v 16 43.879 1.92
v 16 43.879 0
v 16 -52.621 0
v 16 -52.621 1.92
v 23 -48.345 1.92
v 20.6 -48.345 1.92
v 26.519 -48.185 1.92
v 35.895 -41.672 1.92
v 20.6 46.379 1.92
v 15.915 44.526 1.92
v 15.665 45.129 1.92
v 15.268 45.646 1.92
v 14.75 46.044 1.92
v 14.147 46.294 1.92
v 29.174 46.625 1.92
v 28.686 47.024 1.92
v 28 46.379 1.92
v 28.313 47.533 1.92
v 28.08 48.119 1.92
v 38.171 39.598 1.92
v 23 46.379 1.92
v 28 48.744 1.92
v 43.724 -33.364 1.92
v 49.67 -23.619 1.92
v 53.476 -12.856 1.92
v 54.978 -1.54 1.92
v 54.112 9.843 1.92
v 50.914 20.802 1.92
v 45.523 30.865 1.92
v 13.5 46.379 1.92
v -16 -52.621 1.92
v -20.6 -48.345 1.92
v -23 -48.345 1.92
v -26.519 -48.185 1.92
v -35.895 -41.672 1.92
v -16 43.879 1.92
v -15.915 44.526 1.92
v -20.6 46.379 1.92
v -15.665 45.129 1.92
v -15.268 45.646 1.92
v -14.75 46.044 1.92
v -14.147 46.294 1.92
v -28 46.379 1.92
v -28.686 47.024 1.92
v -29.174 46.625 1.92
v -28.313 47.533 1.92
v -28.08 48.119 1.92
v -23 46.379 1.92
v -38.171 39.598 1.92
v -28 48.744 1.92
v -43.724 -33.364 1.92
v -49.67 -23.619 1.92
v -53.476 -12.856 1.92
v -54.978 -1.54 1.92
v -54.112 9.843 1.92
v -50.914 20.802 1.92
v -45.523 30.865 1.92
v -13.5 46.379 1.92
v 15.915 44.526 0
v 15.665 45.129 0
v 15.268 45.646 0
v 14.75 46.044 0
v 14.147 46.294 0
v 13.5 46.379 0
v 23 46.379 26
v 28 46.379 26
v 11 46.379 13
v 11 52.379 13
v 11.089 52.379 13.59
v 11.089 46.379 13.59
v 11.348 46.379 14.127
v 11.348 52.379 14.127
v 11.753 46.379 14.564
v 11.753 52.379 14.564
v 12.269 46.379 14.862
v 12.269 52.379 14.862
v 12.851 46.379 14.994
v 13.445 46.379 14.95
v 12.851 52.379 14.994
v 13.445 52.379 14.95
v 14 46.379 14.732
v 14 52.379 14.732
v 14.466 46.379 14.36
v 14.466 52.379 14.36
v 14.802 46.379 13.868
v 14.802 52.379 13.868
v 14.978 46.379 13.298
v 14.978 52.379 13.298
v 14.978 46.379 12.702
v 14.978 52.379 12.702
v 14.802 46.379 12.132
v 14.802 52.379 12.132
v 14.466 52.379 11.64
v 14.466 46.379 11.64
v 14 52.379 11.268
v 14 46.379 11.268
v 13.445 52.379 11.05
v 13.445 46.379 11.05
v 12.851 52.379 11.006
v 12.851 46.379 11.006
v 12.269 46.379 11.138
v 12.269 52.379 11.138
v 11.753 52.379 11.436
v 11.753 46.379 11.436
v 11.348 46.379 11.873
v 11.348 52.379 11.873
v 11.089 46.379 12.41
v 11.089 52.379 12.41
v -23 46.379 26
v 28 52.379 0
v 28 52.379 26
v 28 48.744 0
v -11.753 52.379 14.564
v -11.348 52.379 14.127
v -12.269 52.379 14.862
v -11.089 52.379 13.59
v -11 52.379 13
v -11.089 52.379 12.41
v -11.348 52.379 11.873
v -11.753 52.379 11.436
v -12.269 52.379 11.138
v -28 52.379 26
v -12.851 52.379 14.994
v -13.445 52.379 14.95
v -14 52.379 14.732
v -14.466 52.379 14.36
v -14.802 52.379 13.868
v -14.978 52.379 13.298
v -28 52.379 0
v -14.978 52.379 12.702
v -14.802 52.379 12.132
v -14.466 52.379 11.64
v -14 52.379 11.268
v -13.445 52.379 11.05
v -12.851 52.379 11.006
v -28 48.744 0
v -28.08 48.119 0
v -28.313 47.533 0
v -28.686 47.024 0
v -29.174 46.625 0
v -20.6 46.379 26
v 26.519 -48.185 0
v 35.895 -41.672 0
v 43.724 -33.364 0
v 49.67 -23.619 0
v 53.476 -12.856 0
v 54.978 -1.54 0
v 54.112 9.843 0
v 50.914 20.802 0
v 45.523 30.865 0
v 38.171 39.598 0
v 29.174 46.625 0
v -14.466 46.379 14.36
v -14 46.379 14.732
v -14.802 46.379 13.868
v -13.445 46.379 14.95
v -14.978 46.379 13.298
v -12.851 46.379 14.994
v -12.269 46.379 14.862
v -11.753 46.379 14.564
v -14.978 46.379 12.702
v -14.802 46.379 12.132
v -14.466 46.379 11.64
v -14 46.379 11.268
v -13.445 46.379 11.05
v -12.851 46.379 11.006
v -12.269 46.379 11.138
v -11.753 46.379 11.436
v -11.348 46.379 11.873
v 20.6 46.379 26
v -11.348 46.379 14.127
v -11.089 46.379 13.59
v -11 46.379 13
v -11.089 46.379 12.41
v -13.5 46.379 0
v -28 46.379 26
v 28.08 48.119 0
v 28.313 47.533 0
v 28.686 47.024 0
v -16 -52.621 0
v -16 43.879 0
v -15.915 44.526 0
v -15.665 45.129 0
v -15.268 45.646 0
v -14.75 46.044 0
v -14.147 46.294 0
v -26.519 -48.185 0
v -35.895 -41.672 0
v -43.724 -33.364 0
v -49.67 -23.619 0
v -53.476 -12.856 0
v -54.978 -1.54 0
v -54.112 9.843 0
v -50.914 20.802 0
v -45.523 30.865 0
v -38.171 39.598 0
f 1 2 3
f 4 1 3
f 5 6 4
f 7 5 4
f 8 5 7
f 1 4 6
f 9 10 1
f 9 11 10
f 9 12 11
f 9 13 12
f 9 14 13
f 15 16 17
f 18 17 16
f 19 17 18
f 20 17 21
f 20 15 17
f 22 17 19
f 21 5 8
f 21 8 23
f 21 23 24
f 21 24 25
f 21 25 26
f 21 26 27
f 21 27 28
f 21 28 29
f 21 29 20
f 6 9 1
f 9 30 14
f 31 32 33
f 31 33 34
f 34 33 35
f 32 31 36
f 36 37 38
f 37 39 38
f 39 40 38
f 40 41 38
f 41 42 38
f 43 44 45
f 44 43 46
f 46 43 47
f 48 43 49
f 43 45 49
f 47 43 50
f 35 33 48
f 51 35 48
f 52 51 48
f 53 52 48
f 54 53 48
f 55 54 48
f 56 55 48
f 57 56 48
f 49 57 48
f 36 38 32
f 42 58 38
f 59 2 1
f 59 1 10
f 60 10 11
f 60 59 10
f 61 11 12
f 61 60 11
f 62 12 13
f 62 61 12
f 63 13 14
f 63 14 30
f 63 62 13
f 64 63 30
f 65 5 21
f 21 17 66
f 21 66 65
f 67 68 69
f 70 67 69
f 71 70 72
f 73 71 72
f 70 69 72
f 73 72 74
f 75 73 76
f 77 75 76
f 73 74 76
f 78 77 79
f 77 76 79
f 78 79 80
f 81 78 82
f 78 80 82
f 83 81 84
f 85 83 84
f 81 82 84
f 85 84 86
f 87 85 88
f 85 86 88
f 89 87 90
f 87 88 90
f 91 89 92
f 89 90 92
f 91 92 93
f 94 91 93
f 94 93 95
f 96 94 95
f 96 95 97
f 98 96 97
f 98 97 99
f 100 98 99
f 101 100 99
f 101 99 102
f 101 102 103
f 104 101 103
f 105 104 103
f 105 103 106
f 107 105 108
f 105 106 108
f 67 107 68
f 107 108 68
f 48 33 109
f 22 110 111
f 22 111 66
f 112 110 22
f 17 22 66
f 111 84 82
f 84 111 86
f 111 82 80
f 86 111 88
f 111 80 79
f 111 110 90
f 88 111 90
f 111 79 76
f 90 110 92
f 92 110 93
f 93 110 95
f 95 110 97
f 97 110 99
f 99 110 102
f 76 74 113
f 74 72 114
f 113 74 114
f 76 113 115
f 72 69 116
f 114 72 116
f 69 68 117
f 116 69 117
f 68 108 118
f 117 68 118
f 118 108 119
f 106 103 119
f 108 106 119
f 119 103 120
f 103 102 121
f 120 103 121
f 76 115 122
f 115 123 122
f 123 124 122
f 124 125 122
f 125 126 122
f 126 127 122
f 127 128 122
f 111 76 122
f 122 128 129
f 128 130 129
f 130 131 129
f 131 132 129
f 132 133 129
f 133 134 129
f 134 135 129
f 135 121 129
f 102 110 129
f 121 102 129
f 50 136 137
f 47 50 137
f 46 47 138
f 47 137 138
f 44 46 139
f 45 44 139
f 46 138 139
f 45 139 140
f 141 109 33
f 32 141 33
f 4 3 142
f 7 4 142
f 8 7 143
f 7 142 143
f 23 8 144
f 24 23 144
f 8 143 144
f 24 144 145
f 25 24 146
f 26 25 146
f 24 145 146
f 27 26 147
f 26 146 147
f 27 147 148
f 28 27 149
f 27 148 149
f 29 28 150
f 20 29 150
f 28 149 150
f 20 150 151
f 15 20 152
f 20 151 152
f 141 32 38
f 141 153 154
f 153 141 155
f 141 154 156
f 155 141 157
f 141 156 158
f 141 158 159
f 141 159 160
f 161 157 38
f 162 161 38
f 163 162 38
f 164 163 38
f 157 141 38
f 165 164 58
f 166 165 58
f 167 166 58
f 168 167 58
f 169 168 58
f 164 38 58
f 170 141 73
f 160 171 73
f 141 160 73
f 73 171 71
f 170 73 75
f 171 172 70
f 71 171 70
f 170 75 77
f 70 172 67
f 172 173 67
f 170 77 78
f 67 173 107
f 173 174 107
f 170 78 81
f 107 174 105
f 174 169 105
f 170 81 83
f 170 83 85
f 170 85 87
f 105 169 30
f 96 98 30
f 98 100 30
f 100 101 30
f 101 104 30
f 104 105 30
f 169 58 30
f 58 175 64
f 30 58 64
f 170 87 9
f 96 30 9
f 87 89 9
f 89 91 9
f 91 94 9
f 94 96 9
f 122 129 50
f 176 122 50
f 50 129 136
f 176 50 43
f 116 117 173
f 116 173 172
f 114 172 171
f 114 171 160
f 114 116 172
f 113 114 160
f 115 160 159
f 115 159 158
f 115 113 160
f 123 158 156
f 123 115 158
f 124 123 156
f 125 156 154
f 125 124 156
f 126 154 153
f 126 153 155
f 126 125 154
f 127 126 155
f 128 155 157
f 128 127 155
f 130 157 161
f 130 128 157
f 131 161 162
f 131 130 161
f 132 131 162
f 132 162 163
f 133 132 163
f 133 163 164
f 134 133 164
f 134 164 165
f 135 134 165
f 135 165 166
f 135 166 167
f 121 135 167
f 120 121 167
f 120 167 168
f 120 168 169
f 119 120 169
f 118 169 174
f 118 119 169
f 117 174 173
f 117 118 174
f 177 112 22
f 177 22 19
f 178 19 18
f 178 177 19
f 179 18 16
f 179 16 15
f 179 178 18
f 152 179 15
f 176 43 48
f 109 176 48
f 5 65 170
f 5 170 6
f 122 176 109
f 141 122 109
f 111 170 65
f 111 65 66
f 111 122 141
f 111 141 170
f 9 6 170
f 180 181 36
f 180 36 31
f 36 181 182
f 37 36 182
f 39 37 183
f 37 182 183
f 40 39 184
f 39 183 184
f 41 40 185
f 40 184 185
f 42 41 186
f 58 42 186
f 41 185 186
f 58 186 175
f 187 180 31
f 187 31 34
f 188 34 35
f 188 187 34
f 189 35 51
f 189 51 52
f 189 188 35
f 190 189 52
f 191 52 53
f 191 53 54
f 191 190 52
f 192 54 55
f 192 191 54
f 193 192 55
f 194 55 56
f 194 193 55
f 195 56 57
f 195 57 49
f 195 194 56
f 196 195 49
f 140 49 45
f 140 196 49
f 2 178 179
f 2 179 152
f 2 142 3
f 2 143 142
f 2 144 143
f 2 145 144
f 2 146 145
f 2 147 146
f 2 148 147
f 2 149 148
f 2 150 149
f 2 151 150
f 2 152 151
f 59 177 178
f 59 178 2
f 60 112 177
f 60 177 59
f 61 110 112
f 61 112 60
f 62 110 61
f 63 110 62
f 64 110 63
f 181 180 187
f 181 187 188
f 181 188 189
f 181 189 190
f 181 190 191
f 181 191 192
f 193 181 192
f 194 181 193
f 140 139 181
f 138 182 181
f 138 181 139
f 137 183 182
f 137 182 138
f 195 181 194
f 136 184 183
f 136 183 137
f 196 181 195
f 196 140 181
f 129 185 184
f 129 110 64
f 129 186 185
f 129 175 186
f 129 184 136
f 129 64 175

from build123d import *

# Parameters (mm, degrees)
PAD018_DEPTH = 1.92
SKETCH042_W  = 28
SKETCH042_H  = 26
SKETCH042_R  = 2
PAD020_DEPTH = 6
PAD021_DEPTH = 2.4


with BuildPart() as part:
    # Sketch038 → Pad018 (new body)
    with BuildSketch(Plane.XY):
        with BuildLine():
            ThreePointArc((16, -52.6212884677), (54.5217663163, -7.237195434), (29.1738989847, 46.6249248582))
            ThreePointArc((28, 48.7442306082), (28.3130783141, 47.5328784807), (29.1738989848, 46.6249248582))
            Line((28, 52.3787115323), (28, 48.7442306082))
            Line((0, 52.3787115323), (28, 52.3787115323))
            Line((0, 46.3787115323), (0, 52.3787115323))
            Line((13.5000003539, 46.3787115323), (0, 46.3787115323))
            ThreePointArc((16, 43.8787114546), (15.2677671056, 45.6464783327), (13.5000003539, 46.3787115323))
            Line((16, 43.8787114546), (16, -52.6212884677))
        make_face()
    pad018 = extrude(amount=PAD018_DEPTH)

    # Sketch042 (on DatumPlane) → Pad020 (join)
    with BuildSketch(Plane(origin=(0, 52.3787115323, 0), x_dir=(-1, 0, 0), z_dir=(0, 1, 0))):
        with Locations((-14, 13)):
            Rectangle(SKETCH042_W, SKETCH042_H)
        with Locations((-13, 13)):
            Circle(SKETCH042_R, mode=Mode.SUBTRACT)
    pad020 = extrude(amount=-PAD020_DEPTH)

    # Sketch043 (on DatumPlane) → Pad021 (join)
    with BuildSketch(Plane(origin=(23, 0, 0), x_dir=(0, -1, 0), z_dir=(-1, 0, 0))):
        Polygon((-46.3787115323, 26), (48.344858, 1.92), (-46.3787115323, 1.92), align=None)
    pad021 = extrude(amount=PAD021_DEPTH)

    # Mirrored011: Pad018, Pad020, Pad021 across Sketch038 V_Axis
    add(pad018.mirror(Plane(origin=(0, 0, 0), x_dir=(0, 0, 1), z_dir=(1, 0, 0))))
    add(pad020.mirror(Plane(origin=(0, 0, 0), x_dir=(0, 0, 1), z_dir=(1, 0, 0))))
    add(pad021.mirror(Plane(origin=(0, 0, 0), x_dir=(0, 0, 1), z_dir=(1, 0, 0))))


solid = part.part
